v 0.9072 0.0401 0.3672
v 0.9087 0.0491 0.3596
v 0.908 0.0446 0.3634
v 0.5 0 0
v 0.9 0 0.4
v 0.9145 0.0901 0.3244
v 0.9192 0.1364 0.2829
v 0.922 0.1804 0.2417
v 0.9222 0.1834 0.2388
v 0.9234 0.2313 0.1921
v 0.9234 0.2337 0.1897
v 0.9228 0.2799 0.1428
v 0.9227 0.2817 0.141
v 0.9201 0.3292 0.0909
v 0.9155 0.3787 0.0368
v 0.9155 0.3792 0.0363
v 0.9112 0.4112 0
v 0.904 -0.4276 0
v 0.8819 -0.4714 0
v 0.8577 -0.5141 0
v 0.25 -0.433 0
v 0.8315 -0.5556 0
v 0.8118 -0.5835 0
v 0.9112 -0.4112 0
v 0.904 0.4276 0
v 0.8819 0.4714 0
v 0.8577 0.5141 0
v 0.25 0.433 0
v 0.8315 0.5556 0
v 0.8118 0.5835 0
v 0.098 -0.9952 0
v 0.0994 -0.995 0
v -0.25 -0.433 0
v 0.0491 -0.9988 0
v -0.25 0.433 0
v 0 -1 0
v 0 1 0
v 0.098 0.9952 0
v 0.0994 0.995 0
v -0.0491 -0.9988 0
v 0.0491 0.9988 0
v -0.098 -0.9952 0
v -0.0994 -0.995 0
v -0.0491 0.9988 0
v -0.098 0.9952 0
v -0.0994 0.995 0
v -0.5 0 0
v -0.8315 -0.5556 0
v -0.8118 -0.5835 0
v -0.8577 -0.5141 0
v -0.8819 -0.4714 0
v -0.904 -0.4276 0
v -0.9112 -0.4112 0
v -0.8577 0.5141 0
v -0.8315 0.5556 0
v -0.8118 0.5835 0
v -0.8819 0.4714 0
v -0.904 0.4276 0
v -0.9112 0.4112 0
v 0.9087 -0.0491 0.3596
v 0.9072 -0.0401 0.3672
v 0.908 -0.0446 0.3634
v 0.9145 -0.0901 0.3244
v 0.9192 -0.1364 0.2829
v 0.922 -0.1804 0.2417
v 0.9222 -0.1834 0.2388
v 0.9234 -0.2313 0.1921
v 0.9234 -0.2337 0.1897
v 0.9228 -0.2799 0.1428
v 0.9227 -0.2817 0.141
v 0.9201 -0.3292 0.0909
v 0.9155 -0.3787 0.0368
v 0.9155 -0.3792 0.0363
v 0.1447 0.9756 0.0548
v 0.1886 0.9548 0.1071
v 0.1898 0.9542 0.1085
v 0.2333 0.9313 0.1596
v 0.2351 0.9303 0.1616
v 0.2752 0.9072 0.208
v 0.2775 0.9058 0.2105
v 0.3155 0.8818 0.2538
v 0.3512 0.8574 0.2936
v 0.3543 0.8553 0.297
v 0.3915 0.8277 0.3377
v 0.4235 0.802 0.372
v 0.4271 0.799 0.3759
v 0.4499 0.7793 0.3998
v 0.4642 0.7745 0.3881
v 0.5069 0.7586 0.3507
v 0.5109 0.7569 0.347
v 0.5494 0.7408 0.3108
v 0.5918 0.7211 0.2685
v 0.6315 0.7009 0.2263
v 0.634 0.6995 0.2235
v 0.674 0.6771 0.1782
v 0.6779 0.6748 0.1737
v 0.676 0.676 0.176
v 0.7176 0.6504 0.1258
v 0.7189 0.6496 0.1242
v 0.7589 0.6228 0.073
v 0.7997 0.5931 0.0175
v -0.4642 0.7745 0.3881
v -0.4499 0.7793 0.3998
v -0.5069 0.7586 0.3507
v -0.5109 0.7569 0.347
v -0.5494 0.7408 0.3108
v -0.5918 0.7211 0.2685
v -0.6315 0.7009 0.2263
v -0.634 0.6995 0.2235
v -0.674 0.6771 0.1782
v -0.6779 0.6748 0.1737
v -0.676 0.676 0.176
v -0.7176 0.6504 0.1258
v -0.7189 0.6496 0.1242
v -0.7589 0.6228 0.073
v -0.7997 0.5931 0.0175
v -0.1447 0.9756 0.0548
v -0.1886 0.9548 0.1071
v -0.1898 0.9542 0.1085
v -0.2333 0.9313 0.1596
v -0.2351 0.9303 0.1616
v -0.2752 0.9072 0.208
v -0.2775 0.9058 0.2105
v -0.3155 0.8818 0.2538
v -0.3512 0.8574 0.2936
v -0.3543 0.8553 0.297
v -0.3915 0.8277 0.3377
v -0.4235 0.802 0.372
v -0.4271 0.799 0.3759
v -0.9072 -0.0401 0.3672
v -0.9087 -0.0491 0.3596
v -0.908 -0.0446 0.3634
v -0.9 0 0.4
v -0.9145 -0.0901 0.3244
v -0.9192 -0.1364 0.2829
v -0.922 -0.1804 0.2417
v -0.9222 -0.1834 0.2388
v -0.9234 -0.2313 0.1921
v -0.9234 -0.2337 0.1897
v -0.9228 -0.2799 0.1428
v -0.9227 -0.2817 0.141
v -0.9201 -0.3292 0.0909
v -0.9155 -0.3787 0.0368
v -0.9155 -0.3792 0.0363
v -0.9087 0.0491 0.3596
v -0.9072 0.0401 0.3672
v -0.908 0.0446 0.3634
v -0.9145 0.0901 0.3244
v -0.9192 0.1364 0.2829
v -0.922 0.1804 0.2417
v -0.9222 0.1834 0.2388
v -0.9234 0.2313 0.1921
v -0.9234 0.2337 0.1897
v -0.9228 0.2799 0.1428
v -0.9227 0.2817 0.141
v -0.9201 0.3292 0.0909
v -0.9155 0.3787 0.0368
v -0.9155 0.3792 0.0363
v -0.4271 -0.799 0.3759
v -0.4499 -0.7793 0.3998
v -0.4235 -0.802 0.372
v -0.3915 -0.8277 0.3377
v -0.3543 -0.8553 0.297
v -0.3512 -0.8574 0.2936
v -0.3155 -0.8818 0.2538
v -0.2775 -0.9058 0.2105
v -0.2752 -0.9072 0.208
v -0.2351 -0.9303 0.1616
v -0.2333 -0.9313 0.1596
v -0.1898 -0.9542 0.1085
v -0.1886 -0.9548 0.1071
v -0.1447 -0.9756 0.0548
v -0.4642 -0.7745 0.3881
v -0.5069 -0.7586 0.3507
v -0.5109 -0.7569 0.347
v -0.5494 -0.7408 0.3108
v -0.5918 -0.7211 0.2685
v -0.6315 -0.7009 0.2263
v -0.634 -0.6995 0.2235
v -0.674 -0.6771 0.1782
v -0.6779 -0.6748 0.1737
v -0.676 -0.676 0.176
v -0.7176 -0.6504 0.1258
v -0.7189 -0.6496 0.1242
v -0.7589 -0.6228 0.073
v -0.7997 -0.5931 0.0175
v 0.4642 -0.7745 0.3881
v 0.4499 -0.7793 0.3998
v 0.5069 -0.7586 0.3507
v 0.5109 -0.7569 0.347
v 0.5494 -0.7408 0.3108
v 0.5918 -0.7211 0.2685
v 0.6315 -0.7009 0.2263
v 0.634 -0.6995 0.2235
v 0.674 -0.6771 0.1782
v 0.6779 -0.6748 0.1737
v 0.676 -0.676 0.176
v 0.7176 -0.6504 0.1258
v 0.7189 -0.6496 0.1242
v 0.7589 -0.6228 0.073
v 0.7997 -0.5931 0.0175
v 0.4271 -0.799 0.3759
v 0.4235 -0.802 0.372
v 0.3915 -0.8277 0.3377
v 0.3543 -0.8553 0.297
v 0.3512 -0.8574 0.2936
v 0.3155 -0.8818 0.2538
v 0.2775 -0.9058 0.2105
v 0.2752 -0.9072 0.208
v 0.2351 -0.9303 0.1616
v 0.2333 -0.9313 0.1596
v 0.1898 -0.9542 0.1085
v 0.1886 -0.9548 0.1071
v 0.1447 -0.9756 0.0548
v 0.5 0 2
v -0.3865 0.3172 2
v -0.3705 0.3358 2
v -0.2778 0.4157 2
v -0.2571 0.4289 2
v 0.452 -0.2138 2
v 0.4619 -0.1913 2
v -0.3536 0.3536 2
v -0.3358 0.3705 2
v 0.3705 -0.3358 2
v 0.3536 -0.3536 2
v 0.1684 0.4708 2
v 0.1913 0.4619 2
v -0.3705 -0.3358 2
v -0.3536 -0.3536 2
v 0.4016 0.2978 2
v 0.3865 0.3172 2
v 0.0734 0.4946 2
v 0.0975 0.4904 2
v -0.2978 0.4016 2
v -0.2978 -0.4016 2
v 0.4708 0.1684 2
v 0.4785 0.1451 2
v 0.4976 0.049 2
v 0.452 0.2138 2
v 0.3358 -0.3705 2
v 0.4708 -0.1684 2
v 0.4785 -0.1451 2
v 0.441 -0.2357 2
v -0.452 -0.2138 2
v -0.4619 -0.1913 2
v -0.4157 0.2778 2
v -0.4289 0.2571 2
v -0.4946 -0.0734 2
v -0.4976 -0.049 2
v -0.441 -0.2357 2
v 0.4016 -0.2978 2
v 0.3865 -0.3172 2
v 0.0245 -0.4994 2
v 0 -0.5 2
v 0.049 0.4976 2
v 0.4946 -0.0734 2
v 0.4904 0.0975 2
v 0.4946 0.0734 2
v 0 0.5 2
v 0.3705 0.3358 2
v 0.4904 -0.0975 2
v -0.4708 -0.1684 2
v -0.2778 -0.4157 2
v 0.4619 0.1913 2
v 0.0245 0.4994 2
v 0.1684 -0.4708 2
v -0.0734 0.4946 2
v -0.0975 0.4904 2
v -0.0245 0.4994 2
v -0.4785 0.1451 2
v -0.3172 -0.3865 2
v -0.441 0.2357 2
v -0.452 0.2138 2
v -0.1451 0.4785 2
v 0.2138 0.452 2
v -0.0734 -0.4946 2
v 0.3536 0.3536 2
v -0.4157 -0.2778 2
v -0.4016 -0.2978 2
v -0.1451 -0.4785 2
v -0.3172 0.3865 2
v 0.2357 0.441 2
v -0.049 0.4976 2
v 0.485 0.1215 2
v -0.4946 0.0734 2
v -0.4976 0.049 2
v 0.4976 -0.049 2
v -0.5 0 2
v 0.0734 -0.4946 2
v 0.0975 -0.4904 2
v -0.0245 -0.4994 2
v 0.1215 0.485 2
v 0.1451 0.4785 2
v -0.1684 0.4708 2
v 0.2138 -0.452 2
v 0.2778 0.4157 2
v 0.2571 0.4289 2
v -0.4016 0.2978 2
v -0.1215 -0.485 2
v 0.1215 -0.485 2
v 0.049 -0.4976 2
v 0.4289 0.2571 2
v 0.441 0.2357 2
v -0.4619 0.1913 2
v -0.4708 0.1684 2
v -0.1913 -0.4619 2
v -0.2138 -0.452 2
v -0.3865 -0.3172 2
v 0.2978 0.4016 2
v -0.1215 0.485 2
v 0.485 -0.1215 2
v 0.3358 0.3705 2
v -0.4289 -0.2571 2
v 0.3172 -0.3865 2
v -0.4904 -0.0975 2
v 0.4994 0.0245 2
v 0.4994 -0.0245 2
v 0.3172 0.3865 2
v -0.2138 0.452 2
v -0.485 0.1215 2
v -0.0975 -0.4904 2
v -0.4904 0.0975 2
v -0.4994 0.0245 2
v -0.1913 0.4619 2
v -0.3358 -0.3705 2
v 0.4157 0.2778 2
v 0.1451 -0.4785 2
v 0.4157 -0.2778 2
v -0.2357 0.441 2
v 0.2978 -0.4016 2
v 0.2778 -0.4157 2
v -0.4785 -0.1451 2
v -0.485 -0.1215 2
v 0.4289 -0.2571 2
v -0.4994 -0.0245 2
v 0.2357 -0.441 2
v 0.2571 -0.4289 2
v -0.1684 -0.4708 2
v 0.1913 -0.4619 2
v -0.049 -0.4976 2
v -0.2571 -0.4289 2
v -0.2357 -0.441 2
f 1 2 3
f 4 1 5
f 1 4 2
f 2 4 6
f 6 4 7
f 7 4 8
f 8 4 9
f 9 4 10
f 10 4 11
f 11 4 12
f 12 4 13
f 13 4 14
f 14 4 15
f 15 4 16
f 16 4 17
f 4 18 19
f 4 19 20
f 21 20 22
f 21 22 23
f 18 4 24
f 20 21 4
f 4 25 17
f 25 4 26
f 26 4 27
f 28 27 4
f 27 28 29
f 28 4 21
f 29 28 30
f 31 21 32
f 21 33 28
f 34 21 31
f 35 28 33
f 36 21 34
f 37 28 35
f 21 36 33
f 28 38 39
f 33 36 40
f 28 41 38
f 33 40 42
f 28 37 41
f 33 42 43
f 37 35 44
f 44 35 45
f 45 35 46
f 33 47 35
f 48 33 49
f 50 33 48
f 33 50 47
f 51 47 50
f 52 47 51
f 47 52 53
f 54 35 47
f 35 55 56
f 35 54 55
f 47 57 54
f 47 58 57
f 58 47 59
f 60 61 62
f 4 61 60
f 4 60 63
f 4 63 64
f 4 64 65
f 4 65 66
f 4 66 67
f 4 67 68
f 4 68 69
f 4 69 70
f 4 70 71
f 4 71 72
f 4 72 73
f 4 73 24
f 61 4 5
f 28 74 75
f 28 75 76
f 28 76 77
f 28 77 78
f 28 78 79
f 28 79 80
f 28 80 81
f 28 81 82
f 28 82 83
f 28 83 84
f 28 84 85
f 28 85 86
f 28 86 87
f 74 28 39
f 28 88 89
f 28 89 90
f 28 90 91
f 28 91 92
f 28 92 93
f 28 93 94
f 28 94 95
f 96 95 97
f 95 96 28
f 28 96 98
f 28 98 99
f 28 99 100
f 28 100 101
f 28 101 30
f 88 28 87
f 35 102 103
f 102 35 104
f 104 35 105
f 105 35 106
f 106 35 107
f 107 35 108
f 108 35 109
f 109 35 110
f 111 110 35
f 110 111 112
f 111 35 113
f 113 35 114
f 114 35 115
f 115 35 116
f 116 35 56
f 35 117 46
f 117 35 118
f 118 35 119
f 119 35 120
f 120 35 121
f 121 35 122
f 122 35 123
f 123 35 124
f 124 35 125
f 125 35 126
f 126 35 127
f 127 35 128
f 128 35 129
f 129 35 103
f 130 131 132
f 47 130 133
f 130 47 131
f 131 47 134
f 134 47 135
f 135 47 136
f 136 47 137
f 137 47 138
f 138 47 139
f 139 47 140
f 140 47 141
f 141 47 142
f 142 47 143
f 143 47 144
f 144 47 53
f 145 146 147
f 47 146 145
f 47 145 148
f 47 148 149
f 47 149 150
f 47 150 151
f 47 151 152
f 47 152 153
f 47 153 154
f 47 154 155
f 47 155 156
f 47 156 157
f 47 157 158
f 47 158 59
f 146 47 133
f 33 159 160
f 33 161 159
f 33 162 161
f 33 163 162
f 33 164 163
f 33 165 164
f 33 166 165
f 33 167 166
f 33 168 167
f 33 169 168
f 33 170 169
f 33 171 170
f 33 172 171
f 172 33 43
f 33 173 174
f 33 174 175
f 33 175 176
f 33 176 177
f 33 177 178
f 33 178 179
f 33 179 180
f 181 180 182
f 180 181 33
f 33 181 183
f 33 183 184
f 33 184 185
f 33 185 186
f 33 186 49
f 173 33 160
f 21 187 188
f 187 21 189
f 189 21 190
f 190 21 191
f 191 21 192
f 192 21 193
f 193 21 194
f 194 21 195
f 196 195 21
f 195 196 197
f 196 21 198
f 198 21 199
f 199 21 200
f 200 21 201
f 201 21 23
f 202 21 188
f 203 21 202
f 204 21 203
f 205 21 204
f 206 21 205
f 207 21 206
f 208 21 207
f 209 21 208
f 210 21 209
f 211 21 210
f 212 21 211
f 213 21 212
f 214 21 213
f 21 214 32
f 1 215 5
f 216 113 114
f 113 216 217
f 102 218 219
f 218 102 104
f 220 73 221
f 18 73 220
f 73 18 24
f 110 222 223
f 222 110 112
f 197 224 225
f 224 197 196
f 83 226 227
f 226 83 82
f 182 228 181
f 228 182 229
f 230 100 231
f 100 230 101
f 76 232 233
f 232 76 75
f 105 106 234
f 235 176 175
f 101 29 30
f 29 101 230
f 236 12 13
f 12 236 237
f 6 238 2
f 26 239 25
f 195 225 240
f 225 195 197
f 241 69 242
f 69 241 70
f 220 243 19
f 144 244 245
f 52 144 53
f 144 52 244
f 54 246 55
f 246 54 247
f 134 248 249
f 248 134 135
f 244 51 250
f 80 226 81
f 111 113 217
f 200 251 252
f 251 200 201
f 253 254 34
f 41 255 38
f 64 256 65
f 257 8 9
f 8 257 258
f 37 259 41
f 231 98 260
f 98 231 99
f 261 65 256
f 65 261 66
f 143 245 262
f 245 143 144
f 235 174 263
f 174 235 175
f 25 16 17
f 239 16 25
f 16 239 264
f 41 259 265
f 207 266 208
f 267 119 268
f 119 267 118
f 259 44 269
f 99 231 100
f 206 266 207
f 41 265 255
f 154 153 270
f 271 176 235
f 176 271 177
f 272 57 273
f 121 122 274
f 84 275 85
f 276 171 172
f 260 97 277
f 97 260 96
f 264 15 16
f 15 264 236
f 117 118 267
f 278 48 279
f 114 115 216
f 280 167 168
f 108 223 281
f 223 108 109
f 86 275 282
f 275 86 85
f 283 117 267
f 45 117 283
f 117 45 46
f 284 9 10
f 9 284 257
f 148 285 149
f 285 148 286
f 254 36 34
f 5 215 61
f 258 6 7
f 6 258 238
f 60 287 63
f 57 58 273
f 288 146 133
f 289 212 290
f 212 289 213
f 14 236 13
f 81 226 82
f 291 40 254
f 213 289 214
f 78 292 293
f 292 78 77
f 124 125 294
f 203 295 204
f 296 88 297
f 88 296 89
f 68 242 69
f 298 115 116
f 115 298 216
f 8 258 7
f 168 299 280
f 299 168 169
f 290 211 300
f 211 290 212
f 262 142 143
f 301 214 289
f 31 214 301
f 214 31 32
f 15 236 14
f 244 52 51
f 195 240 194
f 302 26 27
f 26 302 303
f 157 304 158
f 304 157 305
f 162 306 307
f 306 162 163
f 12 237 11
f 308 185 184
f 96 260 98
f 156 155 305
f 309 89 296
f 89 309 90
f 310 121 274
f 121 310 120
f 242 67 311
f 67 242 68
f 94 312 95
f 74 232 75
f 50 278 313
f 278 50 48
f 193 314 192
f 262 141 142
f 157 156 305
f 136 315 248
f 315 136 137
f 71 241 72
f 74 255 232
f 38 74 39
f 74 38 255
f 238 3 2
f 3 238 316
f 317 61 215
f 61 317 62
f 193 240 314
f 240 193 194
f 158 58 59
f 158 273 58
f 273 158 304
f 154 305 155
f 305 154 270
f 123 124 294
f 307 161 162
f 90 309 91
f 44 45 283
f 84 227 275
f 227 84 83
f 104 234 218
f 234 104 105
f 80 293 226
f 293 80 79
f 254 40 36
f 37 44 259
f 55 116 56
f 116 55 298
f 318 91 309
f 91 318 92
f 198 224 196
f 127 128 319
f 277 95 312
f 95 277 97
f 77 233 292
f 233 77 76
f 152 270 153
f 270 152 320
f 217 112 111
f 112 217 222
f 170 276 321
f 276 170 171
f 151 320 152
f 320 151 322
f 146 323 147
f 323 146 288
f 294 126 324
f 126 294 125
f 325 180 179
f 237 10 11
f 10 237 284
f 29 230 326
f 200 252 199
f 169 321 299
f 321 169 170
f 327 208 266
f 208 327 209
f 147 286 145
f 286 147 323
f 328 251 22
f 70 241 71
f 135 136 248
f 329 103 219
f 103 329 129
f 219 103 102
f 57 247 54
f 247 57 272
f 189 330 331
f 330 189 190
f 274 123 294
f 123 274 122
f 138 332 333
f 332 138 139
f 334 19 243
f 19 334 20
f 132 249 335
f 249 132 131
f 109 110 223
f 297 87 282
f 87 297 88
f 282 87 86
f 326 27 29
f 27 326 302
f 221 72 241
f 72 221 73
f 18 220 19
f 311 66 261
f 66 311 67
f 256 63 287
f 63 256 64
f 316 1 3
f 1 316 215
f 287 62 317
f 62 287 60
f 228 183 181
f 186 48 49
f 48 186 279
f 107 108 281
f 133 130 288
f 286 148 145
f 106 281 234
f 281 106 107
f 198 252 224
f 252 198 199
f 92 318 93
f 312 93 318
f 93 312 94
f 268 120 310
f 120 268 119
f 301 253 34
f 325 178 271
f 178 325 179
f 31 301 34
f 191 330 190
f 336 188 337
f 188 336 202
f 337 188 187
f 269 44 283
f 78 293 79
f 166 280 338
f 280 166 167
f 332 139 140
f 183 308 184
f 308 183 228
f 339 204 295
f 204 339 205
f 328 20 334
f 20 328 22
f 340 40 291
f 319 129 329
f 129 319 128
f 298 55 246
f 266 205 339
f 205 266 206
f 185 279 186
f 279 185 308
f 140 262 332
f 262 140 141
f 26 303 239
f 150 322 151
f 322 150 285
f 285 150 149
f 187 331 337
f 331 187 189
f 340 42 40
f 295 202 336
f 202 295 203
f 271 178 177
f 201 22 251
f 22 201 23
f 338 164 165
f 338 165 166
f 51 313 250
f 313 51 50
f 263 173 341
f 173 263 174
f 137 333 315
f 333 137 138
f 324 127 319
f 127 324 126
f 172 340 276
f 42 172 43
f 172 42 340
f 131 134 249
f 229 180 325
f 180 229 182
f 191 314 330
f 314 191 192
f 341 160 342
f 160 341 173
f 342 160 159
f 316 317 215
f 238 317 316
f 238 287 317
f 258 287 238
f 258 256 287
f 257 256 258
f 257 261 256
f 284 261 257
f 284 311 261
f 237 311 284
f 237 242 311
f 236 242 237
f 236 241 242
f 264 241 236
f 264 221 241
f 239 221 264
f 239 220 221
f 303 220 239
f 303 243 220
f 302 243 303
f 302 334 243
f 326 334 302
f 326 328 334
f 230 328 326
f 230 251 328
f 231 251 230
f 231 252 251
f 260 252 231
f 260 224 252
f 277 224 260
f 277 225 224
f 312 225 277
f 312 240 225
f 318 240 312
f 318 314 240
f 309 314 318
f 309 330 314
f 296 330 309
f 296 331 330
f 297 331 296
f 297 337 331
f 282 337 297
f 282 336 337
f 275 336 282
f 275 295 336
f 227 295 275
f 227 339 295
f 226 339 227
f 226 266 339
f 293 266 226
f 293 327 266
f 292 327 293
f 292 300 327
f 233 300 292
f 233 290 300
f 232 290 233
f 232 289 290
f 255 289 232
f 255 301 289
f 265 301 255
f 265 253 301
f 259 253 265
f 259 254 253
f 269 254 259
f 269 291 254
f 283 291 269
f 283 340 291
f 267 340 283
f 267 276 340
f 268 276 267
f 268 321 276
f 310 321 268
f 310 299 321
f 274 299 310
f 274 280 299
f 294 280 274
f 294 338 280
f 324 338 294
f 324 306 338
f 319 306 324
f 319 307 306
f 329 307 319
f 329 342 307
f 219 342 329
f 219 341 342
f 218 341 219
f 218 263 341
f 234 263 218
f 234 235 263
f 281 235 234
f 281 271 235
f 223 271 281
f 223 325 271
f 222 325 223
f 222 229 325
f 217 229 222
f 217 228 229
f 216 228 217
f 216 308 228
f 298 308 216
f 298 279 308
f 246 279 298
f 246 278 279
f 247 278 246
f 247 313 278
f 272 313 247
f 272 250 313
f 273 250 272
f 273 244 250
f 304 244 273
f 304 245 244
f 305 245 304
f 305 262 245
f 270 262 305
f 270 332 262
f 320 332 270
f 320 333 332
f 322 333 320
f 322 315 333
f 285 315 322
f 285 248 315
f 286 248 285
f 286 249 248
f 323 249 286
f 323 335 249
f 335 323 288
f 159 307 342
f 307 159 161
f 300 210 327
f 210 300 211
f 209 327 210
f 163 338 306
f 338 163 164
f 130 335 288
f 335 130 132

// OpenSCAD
// polyhedron(
//     points=[
//         [xtip,0,0], // [0] Nullpunkt
//         [r,0,0],    // [1] Aussen Mitte
//         [r,0,f],    // [2] Aussen Oben
//         [r,f,0],    // [3] Aussen Rechts
//         [r,-f,0],   // [4] Aussen Links
//         [r,0,-f],   // [5] Aussen Unten
//     ],
//     triangles=[
//         [0,3,2], // spitze rechts oben
//         [1,2,3], // aussenflaeche rechts oben
//         [0,2,4], // spitze links oben
//         [1,4,2], // aussenflaeche links oben
//         [0,4,5], // spitze links unten
//         [1,3,5], // aussenflaeche rechts unten
//         [0,5,3], // spitze rechts unten
//         [1,5,4], // aussenflaeche links unten
//     ]
// );
r=1;
n=6;
alpha=360/n;
f=sin(alpha/2)*r;

module spike(r=r, dentdepth=1) {
    assign(xtip=r-(f*dentdepth)) {
        polyhedron(
            points=[
                [xtip,0,0], // [0] Nullpunkt
                [r,0,0],    // [1] Aussen Mitte
                [r,0,f],    // [2] Aussen Oben
                [r,f,0],    // [3] Aussen Rechts
                [r,-f,0],   // [4] Aussen Links
            ],
            triangles=[
                [0,3,2], // spitze rechts oben
                [0,2,4], // spitze links oben
                [0,4,3], // spitze unten
                [2,3,4], // aussenflaeche 
            ]
        );
    }
}

difference() {
    cylinder(r1=1, r2=0.5, h=2, center=false, $fn=128);
    for(angle=[0:n-1]){
        rotate([0,0,angle*alpha]) spike();
    }
}
